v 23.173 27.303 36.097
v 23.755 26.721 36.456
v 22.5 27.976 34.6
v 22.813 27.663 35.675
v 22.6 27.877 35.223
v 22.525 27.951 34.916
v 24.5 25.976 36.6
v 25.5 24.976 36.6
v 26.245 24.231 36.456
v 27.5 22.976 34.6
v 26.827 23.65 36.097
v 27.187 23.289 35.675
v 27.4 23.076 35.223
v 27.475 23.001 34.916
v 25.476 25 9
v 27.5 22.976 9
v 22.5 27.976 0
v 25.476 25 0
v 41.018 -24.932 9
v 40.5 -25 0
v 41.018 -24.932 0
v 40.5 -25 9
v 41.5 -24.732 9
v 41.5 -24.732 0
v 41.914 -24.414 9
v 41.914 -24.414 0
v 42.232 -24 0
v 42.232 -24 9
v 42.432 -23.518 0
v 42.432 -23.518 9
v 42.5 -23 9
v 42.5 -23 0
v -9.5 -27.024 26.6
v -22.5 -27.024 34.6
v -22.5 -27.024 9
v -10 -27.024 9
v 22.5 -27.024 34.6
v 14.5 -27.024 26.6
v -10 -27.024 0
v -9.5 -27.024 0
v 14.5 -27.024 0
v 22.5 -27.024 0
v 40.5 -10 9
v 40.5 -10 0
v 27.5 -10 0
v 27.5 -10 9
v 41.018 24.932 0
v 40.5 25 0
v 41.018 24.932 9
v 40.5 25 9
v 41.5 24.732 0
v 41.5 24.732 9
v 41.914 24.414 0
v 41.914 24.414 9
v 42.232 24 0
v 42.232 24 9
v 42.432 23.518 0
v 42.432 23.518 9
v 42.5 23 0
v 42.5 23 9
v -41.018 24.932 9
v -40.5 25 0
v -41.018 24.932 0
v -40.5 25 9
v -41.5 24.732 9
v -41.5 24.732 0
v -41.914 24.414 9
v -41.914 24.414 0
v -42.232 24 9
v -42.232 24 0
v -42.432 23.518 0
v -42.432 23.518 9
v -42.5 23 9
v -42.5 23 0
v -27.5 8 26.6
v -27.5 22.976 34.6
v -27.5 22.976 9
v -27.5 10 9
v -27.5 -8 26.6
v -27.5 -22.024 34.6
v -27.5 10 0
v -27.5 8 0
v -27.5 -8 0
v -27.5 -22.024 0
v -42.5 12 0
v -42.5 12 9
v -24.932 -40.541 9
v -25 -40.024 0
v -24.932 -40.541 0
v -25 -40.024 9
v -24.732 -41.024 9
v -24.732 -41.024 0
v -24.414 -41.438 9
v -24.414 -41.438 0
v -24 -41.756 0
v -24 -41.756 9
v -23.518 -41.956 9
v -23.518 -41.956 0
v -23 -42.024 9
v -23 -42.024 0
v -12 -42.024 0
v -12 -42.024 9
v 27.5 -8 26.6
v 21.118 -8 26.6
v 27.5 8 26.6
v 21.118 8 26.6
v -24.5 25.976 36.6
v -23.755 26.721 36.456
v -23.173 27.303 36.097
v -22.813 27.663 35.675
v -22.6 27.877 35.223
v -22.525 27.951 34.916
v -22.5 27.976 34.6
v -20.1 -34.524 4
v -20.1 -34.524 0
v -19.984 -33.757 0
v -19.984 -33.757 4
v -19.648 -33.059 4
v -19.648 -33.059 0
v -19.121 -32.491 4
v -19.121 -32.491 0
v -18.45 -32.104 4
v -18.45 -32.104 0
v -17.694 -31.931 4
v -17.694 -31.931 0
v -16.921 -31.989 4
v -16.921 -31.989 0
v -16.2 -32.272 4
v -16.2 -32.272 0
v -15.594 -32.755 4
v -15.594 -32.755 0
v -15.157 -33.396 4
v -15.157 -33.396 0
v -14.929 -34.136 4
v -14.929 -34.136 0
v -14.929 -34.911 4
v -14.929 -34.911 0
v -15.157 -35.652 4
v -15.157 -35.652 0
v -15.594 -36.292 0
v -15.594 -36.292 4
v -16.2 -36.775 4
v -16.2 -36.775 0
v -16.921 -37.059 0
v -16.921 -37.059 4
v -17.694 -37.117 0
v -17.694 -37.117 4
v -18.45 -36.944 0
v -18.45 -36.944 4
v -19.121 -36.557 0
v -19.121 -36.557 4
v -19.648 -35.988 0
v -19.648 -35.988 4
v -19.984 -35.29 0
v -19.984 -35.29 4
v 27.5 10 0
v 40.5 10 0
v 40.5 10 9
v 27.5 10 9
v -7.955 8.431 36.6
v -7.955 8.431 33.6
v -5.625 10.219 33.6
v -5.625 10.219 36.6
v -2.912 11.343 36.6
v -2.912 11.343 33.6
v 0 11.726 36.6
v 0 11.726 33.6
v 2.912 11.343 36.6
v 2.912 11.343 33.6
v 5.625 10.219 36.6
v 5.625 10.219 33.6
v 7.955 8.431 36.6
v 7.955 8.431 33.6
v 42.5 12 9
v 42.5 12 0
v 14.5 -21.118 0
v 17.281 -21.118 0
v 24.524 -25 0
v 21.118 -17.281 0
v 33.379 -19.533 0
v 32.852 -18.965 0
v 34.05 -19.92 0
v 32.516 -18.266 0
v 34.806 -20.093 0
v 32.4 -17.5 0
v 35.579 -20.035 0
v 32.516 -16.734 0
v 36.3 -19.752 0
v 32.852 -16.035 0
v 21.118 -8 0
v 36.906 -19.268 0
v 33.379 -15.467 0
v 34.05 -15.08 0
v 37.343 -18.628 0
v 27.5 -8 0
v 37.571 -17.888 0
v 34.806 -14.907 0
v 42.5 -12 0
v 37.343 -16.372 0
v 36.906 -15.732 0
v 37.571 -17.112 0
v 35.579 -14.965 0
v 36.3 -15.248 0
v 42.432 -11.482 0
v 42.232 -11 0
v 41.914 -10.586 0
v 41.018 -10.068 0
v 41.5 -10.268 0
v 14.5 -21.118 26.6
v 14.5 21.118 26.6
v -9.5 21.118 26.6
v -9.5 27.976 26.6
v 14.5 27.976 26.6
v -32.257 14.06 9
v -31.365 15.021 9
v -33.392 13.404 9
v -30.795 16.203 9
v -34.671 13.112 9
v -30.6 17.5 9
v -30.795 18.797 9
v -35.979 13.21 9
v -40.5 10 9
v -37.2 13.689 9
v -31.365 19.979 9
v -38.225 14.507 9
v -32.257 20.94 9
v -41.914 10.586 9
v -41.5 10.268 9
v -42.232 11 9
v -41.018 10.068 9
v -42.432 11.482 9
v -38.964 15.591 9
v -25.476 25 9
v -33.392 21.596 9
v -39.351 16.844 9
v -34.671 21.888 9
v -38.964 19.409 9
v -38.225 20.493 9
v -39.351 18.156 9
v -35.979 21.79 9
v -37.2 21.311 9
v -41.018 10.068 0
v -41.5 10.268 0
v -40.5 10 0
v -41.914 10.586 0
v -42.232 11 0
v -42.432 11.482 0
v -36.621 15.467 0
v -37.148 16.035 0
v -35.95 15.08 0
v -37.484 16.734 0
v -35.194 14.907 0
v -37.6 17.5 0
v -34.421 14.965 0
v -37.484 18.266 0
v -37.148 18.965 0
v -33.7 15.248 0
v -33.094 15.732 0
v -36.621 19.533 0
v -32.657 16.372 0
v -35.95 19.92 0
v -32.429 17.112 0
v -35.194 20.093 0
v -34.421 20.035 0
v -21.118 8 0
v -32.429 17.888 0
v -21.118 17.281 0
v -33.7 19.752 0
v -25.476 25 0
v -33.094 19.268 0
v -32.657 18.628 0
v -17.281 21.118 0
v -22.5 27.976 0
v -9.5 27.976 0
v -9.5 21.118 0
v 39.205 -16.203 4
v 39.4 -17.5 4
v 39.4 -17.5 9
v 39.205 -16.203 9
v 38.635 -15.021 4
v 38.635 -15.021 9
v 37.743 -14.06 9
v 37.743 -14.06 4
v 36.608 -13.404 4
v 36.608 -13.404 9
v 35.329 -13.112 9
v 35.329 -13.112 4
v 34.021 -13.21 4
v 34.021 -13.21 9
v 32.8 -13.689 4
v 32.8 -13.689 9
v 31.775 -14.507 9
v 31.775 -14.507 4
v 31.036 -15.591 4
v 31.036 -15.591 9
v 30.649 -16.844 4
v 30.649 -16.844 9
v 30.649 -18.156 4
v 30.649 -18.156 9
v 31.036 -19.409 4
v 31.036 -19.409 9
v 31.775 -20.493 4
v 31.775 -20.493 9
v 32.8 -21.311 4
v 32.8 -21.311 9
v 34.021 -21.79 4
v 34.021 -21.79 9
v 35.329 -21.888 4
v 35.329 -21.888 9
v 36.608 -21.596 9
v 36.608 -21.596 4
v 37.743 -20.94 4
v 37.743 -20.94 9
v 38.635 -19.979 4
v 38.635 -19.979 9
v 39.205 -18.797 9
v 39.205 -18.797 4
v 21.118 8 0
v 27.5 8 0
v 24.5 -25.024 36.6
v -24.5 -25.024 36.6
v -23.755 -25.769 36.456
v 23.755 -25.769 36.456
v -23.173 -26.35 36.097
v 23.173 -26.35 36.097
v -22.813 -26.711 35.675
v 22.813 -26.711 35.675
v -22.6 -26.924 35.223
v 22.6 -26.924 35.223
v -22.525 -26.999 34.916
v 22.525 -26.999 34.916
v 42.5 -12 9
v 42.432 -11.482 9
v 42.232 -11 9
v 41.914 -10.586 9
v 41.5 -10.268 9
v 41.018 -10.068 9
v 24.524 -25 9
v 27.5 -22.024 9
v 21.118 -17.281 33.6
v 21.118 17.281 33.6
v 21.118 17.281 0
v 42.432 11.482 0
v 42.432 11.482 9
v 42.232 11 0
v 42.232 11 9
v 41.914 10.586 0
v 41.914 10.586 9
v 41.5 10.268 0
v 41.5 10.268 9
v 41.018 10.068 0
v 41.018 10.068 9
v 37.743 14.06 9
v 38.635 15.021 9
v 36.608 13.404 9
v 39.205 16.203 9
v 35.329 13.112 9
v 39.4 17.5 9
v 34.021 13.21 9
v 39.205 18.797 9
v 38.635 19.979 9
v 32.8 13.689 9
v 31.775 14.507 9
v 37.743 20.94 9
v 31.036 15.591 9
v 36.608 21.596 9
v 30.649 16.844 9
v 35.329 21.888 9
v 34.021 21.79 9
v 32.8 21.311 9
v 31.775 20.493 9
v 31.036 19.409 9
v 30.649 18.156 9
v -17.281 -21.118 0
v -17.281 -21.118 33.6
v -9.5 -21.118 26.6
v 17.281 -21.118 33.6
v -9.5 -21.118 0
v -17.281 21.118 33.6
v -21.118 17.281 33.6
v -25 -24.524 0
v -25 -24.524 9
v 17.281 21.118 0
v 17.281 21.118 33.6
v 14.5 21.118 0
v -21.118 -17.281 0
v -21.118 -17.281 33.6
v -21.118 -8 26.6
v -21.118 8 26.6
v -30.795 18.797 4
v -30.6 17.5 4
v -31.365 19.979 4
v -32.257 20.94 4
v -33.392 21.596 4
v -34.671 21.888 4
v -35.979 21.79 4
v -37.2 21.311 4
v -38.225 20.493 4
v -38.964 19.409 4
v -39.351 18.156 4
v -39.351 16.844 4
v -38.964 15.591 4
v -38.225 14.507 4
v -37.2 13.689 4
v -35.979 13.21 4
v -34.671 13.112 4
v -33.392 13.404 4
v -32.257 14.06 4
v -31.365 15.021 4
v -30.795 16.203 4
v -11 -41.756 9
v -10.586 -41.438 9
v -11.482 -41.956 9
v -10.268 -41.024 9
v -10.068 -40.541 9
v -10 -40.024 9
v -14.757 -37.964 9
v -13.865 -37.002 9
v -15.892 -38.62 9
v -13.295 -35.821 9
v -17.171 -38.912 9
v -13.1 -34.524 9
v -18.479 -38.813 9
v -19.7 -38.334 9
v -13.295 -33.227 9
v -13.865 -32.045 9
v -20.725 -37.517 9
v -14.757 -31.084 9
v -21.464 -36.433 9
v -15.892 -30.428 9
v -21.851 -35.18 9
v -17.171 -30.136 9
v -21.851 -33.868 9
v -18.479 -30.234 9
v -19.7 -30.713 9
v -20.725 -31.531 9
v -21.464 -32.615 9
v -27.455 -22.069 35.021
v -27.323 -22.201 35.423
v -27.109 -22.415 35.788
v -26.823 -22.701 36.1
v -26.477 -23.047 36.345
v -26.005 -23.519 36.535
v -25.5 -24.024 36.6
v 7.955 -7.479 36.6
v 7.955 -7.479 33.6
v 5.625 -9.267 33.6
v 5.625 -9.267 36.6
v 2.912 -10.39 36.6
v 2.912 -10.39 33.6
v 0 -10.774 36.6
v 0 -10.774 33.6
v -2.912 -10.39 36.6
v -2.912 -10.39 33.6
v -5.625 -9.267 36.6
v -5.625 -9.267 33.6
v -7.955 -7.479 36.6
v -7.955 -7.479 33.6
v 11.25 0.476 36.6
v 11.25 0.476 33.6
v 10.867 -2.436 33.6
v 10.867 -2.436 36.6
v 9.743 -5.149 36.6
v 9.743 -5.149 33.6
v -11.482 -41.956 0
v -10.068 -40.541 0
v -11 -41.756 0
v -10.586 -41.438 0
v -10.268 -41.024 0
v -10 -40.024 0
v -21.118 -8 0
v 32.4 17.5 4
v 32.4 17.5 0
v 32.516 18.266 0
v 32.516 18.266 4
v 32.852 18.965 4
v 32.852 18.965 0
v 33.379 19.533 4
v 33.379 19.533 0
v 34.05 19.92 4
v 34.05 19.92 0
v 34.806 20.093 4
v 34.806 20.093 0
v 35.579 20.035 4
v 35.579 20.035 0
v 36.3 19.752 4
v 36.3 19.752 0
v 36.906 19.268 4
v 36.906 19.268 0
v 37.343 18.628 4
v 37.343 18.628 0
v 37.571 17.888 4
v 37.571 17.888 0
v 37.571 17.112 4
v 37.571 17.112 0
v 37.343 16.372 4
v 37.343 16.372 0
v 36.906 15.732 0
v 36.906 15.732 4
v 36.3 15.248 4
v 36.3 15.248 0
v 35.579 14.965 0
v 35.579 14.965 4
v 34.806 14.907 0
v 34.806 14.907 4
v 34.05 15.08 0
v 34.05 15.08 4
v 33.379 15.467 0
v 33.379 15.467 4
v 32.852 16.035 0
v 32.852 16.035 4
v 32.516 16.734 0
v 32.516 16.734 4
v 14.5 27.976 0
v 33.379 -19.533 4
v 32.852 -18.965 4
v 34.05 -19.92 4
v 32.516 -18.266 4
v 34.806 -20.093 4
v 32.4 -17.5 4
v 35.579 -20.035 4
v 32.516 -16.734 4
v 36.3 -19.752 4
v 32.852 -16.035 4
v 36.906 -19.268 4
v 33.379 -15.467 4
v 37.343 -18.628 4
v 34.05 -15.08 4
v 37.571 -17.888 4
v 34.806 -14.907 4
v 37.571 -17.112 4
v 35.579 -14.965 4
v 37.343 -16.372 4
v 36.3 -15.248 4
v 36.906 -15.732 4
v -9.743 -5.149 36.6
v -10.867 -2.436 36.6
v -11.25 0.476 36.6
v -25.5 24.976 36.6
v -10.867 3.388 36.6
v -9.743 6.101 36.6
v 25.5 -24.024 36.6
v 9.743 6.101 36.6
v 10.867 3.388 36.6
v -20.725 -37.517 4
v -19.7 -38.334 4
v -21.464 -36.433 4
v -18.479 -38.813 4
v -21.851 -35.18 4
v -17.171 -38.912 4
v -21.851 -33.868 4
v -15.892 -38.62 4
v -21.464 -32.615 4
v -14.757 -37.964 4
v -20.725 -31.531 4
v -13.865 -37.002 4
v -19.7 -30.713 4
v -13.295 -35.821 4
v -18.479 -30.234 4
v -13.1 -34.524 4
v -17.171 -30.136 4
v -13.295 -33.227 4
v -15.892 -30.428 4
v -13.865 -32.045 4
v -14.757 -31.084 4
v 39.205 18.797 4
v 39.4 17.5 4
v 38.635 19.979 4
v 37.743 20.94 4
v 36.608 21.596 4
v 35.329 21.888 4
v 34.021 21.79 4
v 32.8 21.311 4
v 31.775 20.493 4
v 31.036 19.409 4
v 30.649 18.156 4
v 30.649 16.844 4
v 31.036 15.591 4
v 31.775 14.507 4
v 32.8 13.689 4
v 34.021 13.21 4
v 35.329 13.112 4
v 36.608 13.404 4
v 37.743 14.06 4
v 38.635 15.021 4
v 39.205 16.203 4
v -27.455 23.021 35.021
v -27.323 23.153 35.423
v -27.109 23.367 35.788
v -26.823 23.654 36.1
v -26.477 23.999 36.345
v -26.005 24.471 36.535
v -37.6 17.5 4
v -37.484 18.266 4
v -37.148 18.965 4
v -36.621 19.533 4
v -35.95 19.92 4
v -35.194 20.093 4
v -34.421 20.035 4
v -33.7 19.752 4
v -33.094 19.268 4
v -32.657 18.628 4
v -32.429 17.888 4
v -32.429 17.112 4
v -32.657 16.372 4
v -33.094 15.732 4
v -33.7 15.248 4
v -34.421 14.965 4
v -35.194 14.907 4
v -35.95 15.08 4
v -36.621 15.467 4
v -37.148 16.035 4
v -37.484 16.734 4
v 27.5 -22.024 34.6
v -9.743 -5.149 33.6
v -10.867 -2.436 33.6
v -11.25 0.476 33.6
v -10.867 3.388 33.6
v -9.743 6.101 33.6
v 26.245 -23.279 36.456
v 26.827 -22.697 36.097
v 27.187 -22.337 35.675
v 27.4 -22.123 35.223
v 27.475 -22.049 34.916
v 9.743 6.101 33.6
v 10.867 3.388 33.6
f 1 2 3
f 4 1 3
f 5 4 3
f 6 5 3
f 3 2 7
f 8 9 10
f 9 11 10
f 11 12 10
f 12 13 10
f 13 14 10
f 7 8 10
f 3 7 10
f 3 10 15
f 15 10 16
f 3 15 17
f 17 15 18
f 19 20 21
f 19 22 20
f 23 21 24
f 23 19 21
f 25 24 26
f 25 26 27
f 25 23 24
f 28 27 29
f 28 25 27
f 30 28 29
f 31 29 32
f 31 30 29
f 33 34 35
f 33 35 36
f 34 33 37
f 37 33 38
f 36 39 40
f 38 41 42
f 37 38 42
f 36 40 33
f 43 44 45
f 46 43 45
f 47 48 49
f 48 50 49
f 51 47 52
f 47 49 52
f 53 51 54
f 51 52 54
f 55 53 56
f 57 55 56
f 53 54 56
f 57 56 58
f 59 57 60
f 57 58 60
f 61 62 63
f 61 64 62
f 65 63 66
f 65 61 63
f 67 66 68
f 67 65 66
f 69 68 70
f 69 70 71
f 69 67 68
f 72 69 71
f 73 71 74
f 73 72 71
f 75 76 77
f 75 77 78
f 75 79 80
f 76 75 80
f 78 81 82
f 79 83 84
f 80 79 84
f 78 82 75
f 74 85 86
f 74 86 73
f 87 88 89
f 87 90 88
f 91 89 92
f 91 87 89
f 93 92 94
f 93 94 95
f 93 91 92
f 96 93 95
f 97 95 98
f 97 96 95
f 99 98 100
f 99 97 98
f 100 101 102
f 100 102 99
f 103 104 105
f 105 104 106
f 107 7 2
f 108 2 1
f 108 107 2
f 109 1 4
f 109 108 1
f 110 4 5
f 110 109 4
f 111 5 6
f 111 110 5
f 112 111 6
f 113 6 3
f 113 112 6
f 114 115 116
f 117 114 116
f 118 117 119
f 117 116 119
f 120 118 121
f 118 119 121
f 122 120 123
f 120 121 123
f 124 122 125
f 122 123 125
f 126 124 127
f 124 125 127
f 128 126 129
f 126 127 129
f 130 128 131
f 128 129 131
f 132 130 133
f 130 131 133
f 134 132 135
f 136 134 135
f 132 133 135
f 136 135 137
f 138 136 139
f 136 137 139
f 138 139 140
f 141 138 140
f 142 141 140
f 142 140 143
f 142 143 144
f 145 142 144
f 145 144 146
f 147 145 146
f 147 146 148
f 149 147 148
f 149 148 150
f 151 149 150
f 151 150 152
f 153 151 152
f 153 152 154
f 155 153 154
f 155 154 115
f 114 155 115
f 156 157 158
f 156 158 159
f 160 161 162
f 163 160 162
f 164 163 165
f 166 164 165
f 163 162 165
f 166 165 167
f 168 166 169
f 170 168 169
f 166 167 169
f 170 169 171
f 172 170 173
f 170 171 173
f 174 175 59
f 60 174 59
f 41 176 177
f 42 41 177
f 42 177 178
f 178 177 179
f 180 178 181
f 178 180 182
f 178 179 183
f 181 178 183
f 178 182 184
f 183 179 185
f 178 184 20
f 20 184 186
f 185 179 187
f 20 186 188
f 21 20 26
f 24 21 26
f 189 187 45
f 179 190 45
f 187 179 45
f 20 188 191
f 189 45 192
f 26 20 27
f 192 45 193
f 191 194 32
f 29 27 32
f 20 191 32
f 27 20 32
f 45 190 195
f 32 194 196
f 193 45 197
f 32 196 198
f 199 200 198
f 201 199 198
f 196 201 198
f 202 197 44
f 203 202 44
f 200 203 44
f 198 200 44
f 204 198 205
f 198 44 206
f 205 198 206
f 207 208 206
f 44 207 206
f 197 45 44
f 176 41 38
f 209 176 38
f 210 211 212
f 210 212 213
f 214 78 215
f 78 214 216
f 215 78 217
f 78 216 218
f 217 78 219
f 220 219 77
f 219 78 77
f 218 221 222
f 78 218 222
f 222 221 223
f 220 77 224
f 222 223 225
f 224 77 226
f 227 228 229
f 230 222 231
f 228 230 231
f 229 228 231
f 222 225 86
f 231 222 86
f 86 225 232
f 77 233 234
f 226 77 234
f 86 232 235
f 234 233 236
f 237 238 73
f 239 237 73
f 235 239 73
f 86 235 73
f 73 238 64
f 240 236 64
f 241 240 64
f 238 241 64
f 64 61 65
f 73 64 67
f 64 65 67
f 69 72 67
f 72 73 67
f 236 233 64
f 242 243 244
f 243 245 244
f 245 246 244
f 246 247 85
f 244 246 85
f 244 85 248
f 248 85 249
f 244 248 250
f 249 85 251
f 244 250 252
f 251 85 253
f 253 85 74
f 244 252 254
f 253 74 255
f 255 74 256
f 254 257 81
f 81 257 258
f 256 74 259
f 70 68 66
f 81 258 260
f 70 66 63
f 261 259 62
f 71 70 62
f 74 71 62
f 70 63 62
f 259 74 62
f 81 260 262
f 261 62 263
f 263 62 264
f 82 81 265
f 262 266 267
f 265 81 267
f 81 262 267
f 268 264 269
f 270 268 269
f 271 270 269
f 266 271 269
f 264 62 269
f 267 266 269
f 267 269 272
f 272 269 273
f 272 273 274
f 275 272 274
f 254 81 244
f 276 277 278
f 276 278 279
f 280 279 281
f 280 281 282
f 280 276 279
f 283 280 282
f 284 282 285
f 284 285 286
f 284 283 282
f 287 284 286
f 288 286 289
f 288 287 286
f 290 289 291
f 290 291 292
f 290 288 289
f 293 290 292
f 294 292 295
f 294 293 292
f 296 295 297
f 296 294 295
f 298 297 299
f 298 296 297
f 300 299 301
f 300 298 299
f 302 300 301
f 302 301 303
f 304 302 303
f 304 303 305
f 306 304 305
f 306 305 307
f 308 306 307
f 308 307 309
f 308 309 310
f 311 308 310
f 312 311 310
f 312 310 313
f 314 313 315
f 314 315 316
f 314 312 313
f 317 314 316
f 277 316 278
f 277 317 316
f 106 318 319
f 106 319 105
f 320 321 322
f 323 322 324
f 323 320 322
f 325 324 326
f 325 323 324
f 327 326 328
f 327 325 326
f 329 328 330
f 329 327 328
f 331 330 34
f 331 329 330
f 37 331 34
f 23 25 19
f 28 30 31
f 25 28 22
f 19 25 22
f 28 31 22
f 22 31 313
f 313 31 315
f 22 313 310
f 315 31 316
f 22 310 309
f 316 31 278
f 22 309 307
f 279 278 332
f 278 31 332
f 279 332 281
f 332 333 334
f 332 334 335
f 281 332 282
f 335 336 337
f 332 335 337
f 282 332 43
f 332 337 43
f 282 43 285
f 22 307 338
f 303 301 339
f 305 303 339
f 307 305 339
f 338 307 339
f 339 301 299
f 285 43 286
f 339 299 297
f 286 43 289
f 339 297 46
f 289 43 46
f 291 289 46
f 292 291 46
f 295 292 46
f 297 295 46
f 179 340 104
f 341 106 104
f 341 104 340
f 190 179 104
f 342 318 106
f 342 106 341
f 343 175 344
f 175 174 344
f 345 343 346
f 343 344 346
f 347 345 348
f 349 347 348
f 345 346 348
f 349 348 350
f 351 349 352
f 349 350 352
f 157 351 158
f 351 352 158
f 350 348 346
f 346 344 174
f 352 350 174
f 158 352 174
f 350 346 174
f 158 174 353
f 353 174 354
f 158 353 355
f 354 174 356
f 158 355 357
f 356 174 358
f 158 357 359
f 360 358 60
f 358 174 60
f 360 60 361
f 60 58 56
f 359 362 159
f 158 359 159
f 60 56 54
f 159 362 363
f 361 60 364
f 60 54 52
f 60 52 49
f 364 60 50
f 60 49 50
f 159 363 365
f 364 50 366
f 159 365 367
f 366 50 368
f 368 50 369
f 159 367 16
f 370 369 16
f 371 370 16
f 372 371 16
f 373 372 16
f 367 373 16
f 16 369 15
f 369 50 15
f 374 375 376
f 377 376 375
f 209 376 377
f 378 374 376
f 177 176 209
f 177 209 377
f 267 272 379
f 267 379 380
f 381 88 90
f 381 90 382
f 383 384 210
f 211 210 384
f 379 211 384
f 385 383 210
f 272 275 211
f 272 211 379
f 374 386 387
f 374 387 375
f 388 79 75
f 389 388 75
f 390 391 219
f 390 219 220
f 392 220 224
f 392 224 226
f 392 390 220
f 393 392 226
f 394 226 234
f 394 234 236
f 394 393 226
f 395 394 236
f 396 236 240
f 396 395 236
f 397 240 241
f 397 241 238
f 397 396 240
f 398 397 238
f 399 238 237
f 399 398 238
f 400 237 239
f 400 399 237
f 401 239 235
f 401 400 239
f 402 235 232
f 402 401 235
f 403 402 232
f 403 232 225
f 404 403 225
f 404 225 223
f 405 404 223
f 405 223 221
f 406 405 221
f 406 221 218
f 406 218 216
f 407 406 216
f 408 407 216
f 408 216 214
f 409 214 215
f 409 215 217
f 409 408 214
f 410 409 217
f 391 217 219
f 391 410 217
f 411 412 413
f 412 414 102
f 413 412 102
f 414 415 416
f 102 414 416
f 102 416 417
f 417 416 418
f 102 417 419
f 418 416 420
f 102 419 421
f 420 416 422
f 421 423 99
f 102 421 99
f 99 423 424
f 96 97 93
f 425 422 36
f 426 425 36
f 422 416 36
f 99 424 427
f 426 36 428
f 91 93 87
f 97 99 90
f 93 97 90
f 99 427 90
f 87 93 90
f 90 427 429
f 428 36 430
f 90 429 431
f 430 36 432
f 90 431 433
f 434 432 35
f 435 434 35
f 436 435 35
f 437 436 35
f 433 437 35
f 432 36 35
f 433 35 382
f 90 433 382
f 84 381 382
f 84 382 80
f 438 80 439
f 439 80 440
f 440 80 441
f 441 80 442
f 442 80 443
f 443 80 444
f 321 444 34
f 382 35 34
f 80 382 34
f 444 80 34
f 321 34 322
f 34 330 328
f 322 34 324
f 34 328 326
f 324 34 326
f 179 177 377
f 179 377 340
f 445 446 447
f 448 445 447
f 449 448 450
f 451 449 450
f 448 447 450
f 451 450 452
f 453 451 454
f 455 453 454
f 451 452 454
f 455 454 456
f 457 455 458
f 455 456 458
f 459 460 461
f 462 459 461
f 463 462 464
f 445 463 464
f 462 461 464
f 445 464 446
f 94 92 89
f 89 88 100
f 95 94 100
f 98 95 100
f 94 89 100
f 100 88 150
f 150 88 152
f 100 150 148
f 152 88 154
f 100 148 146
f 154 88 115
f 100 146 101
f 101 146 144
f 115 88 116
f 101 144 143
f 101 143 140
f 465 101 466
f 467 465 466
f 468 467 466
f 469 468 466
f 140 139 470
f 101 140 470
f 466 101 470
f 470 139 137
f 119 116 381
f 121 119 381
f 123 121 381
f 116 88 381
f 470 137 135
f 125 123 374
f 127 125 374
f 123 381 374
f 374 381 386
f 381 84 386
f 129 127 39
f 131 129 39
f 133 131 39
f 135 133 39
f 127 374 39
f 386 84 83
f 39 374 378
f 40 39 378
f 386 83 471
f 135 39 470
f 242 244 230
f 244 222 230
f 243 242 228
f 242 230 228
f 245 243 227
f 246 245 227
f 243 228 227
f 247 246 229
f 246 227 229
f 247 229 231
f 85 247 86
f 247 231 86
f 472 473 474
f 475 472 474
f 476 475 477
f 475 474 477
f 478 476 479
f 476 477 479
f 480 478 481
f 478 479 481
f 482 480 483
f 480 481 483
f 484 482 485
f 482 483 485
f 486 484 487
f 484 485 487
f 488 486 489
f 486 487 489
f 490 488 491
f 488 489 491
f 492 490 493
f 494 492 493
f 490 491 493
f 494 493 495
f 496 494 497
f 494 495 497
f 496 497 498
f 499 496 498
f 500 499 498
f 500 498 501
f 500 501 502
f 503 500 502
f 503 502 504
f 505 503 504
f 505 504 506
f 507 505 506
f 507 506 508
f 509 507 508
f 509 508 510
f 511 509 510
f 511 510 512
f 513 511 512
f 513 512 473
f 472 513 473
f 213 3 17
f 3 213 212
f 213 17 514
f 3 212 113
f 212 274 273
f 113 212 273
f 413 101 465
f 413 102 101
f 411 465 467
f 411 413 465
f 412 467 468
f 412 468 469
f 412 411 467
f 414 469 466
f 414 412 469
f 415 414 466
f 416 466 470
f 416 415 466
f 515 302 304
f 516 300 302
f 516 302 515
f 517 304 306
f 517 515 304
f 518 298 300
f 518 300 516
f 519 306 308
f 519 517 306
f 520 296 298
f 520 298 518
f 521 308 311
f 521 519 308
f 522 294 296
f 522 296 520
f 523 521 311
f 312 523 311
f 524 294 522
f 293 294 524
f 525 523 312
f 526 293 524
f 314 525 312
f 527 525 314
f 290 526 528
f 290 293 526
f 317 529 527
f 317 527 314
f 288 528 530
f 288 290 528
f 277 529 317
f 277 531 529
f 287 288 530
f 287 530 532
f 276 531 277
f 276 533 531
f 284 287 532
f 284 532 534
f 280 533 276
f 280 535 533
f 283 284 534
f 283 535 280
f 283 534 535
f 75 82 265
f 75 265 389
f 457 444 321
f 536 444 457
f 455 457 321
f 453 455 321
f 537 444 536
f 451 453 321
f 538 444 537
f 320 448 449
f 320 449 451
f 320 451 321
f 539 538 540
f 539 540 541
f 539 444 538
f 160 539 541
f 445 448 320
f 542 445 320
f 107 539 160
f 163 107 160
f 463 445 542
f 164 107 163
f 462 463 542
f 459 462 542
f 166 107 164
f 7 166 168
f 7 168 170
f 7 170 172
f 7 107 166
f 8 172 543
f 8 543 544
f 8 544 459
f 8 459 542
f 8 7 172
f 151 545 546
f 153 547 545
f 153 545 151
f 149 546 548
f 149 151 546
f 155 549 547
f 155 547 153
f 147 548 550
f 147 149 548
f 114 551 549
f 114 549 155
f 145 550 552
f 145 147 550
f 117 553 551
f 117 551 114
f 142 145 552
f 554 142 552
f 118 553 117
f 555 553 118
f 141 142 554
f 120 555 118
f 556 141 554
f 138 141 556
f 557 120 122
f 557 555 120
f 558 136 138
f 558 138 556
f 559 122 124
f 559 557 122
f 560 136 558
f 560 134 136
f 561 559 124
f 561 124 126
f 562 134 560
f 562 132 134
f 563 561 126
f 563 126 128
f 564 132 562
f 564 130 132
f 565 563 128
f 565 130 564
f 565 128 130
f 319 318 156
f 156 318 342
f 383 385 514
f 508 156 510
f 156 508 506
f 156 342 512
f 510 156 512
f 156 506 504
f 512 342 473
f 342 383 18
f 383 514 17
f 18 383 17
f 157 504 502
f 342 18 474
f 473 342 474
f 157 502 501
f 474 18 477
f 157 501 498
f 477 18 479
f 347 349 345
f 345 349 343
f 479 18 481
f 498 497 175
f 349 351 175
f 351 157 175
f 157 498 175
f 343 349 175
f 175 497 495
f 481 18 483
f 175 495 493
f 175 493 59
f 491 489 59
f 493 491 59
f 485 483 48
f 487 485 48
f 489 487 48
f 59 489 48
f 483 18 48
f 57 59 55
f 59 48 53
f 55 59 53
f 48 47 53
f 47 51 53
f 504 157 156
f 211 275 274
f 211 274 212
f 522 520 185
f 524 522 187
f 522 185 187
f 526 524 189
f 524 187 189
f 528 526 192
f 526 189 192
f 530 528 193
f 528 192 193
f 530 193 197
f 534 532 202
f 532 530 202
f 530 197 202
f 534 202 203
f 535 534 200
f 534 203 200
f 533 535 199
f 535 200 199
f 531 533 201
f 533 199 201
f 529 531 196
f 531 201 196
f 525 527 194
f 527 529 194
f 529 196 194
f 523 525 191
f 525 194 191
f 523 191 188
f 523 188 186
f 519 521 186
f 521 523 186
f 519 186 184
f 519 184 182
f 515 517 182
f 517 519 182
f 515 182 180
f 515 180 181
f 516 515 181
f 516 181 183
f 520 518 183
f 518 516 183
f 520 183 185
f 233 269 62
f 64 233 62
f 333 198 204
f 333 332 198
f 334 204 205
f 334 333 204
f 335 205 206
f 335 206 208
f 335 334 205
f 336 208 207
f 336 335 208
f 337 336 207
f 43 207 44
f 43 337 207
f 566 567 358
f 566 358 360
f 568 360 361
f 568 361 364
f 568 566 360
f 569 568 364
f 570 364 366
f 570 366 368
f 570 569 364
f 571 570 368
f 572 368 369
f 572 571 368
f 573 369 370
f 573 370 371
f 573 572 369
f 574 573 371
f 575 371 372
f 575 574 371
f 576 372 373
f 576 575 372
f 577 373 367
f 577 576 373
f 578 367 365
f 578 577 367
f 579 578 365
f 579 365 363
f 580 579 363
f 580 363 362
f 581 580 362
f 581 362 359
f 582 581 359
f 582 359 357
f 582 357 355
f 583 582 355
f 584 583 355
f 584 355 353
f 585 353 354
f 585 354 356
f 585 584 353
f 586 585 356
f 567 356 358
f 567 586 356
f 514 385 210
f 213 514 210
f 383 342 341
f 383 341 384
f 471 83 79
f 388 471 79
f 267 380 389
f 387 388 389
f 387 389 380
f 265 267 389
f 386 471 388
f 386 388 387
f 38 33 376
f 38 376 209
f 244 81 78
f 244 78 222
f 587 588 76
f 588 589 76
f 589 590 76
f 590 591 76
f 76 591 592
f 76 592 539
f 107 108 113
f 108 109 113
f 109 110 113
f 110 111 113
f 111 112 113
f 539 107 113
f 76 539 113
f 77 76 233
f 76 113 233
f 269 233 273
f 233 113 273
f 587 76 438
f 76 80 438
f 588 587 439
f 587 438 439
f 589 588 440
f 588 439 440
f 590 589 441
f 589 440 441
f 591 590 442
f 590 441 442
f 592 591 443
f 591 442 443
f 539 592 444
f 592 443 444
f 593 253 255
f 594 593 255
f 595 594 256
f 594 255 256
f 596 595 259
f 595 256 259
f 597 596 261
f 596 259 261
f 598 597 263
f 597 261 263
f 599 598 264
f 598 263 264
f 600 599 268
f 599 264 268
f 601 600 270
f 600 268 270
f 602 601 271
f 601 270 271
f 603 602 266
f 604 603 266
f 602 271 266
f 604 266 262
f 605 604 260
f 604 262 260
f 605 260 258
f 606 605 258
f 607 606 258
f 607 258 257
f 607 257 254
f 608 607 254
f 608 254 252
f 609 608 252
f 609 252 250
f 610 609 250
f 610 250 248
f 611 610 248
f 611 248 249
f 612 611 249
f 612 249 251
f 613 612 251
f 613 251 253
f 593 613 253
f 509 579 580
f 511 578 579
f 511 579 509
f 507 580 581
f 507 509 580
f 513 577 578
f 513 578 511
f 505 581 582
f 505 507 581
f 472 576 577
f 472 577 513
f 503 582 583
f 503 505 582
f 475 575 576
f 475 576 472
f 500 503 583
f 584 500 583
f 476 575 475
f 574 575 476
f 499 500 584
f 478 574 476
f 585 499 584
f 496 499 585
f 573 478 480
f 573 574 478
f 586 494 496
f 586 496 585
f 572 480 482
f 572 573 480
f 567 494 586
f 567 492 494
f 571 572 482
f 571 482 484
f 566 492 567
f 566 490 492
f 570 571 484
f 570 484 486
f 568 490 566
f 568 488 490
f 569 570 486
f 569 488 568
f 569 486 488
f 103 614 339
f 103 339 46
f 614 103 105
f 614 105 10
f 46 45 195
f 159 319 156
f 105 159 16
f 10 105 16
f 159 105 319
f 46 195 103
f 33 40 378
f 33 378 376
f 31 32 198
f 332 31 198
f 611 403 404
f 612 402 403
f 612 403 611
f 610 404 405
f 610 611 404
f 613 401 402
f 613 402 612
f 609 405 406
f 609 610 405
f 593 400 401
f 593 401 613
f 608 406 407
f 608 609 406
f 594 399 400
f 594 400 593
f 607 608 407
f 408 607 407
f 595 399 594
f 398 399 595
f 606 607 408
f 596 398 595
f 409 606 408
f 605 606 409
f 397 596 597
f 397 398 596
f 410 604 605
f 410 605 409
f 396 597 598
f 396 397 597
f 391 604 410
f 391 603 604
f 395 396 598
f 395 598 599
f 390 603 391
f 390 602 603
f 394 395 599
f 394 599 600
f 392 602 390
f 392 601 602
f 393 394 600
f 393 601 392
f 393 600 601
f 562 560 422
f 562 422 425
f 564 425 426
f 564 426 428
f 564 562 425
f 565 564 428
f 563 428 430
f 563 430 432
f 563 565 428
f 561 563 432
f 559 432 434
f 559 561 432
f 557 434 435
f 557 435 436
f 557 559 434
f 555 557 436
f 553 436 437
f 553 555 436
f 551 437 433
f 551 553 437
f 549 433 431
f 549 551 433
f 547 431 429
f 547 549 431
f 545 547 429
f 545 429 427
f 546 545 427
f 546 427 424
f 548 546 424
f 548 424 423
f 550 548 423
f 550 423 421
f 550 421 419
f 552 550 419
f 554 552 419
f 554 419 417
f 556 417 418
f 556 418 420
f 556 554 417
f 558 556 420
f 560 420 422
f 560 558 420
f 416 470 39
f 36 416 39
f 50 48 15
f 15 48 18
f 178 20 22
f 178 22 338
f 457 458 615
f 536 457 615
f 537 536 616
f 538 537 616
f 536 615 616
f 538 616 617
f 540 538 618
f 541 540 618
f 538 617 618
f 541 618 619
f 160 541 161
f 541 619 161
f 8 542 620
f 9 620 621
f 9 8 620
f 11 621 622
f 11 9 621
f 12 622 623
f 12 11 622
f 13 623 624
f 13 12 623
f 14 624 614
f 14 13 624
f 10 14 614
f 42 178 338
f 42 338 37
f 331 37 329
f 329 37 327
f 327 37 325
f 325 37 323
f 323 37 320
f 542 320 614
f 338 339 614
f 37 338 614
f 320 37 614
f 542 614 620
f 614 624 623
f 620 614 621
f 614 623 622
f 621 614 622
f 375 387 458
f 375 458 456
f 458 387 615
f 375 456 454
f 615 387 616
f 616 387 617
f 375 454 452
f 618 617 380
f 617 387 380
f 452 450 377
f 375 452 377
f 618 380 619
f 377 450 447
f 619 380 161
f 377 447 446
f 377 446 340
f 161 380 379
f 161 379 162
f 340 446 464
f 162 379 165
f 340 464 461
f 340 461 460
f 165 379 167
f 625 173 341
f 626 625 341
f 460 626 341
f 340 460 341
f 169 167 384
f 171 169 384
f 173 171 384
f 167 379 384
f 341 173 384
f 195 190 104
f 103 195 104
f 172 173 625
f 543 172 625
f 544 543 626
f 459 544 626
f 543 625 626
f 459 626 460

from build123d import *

# Parameters (mm, degrees)
SKETCH2_W           = 55
SKETCH2_H           = 55
BOSS_EXTRUDE1_DEPTH = 33.6
BOSS_EXTRUDE2_DEPTH = 3
SKETCH4_W           = 15
SKETCH4_H           = 15
SKETCH4_R           = 2.6
BOSS_EXTRUDE3_DEPTH = 9
CUT_EXTRUDE1_START  = -5
SKETCH6_R           = 4.4
SKETCH6_R_2         = 2.6
CUT_EXTRUDE1_DEPTH  = 5
CHAMFER1_SIZE       = 5
FILLET4_R           = 2
SKETCH7_W           = 24
SKETCH7_H           = 26.6
CUT_EXTRUDE2_DEPTH  = 67
SKETCH8_W           = 26.6
SKETCH8_H           = 16
CUT_EXTRUDE3_DEPTH  = 67


with BuildPart() as part:
    # Sketch2 → Boss-Extrude1 (new body)
    with BuildSketch(Plane.XY):
        with Locations((0, 0.476186899)):
            Rectangle(SKETCH2_W, SKETCH2_H)
        Polygon((21.118377871, -17.280631787), (21.118377871, 17.280631787), (17.280631787, 21.118377871), (-17.280631787, 21.118377871), (-21.118377871, 17.280631787), (-21.118377871, -17.280631787), (-17.280631787, -21.118377871), (17.280631787, -21.118377871), align=None, mode=Mode.SUBTRACT)
    extrude(amount=BOSS_EXTRUDE1_DEPTH)

    # Sketch3 → Boss-Extrude2 (add)
    with BuildSketch(Plane.XY.offset(33.6)):
        with BuildLine():
            Line((-7.954951288, 8.431138187), (-18.961411379, 19.437598278))
            Line((-18.961411379, 19.437598278), (-21.118377871, 17.280631787))
            Line((-21.118377871, 17.280631787), (-21.118377871, -17.280631787))
            Line((-21.118377871, -17.280631787), (-19.437598278, -18.961411379))
            Line((-19.437598278, -18.961411379), (-7.954951288, -7.478764389))
            ThreePointArc((-7.954951288, -7.478764389), (-11.25, 0.476186899), (-7.954951288, 8.431138187))
        make_face()
        with BuildLine():
            Line((-7.954951288, -7.478764389), (-19.437598278, -18.961411379))
            Line((-19.437598278, -18.961411379), (-17.280631787, -21.118377871))
            Line((-17.280631787, -21.118377871), (17.280631787, -21.118377871))
            Line((17.280631787, -21.118377871), (19.437598278, -18.961411379))
            Line((19.437598278, -18.961411379), (7.954951288, -7.478764389))
            ThreePointArc((7.954951288, -7.478764389), (0, -10.773813101), (-7.954951288, -7.478764389))
        make_face()
        with BuildLine():
            Line((21.118377871, 17.280631787), (18.961411379, 19.437598278))
            Line((18.961411379, 19.437598278), (7.954951288, 8.431138187))
            ThreePointArc((7.954951288, 8.431138187), (10.393644741, 4.781375513), (11.25, 0.476186899))
            ThreePointArc((11.25, 0.476186899), (10.393644741, -3.829001715), (7.954951288, -7.478764389))
            Line((7.954951288, -7.478764389), (19.437598278, -18.961411379))
            Line((19.437598278, -18.961411379), (21.118377871, -17.280631787))
            Line((21.118377871, -17.280631787), (21.118377871, 17.280631787))
        make_face()
        with BuildLine():
            Line((-17.280631787, 21.118377871), (-18.961411379, 19.437598278))
            Line((-18.961411379, 19.437598278), (-7.954951288, 8.431138187))
            ThreePointArc((-7.954951288, 8.431138187), (0, 11.726186899), (7.954951288, 8.431138187))
            Line((7.954951288, 8.431138187), (18.961411379, 19.437598278))
            Line((18.961411379, 19.437598278), (17.280631787, 21.118377871))
            Line((17.280631787, 21.118377871), (-17.280631787, 21.118377871))
        make_face()
        Polygon((-18.961411379, 19.437598278), (-27.5, 27.976186899), (-27.5, -27.023813101), (-19.437598278, -18.961411379), (-21.118377871, -17.280631787), (-21.118377871, 17.280631787), align=None)
        Polygon((-19.437598278, -18.961411379), (-27.5, -27.023813101), (27.5, -27.023813101), (19.437598278, -18.961411379), (17.280631787, -21.118377871), (-17.280631787, -21.118377871), align=None)
        Polygon((27.5, -27.023813101), (27.5, 27.976186899), (18.961411379, 19.437598278), (21.118377871, 17.280631787), (21.118377871, -17.280631787), (19.437598278, -18.961411379), align=None)
        Polygon((27.5, 27.976186899), (-27.5, 27.976186899), (-18.961411379, 19.437598278), (-17.280631787, 21.118377871), (17.280631787, 21.118377871), (18.961411379, 19.437598278), align=None)
    extrude(amount=BOSS_EXTRUDE2_DEPTH)

    # Sketch4 → Boss-Extrude3 (add)
    # profile 1 of 4: a face of its own
    with BuildSketch(Plane(origin=(0, 0, 0), x_dir=(-1, 0, 0), z_dir=(0, 0, -1))):
        with Locations((-35, 17.5)):
            Rectangle(SKETCH4_W, SKETCH4_H)
        with Locations((-35, 17.5)):
            Circle(SKETCH4_R, mode=Mode.SUBTRACT)
    # profile 2 of 4: a face of its own
    with BuildSketch(Plane(origin=(0, 0, 0), x_dir=(-1, 0, 0), z_dir=(0, 0, -1))):
        with Locations((35, 17.5)):
            Rectangle(SKETCH4_W, SKETCH4_H)
        with Locations((35, 17.5)):
            Circle(SKETCH4_R, mode=Mode.SUBTRACT)
    # profile 3 of 4: a face of its own
    with BuildSketch(Plane(origin=(0, 0, 0), x_dir=(-1, 0, 0), z_dir=(0, 0, -1))):
        with Locations((-35, -17.5)):
            Rectangle(SKETCH4_W, SKETCH4_H)
        with Locations((-35, -17.5)):
            Circle(SKETCH4_R, mode=Mode.SUBTRACT)
    # profile 4 of 4: a face of its own
    with BuildSketch(Plane(origin=(0, 0, 0), x_dir=(-1, 0, 0), z_dir=(0, 0, -1))):
        with Locations((17.5, -34.523813101)):
            Rectangle(SKETCH4_W, SKETCH4_H)
        with Locations((17.5, -34.523813101)):
            Circle(SKETCH4_R, mode=Mode.SUBTRACT)
    extrude(amount=-BOSS_EXTRUDE3_DEPTH)

    # Sketch6 → Cut-Extrude1 (cut)
    # profile 1 of 4: a face of its own
    with BuildSketch(Plane.XY.offset(9).offset(CUT_EXTRUDE1_START)):
        with Locations((-17.5, -34.523813101)):
            Circle(SKETCH6_R)
    # profile 2 of 4: a face of its own
    with BuildSketch(Plane.XY.offset(9).offset(CUT_EXTRUDE1_START)):
        with Locations((-35, 17.5)):
            Circle(SKETCH6_R)
    # profile 3 of 4: a face of its own
    with BuildSketch(Plane.XY.offset(9).offset(CUT_EXTRUDE1_START)):
        with Locations((35, -17.5)):
            Circle(SKETCH6_R)
        with Locations(Location((35, -17.5, 0), (0, 0, 180))):
            Circle(SKETCH6_R_2, mode=Mode.SUBTRACT)
    # profile 4 of 4: a face of its own
    with BuildSketch(Plane.XY.offset(9).offset(CUT_EXTRUDE1_START)):
        with Locations((35, 17.5)):
            Circle(SKETCH6_R)
    extrude(amount=CUT_EXTRUDE1_DEPTH, mode=Mode.SUBTRACT)

    # Chamfer1
    chamfer1_edges = [part.edges().sort_by_distance(p)[0] for p in [
        (27.5, -27.023813101, 18.3),
        (-27.5, -27.023813101, 18.3),
        (27.5, 27.976186899, 18.3),
        (-27.5, 27.976186899, 18.3),
    ]]
    chamfer(chamfer1_edges, length=CHAMFER1_SIZE)

    # Fillet4
    fillet4_edges = [part.edges().sort_by_distance(p)[0] for p in [
        (0, 27.976186899, 36.6),
        (27.5, 0.476186899, 36.6),
        (0, -27.023813101, 36.6),
        (-27.5, 0.476186899, 36.6),
        (-25, -42.023813101, 4.5),
        (-10, -42.023813101, 4.5),
        (-42.5, 10, 4.5),
        (-42.5, 25, 4.5),
        (42.5, -25, 4.5),
        (42.5, -10, 4.5),
        (42.5, 10, 4.5),
        (42.5, 25, 4.5),
    ]]
    fillet(fillet4_edges, radius=FILLET4_R)

    # Sketch7 → Cut-Extrude2 (cut)
    with BuildSketch(Plane.XZ.offset(27.023813101)):
        with Locations((2.5, 13.3)):
            Rectangle(SKETCH7_W, SKETCH7_H)
    extrude(amount=-CUT_EXTRUDE2_DEPTH, mode=Mode.SUBTRACT)

    # Sketch8 → Cut-Extrude3 (cut)
    with BuildSketch(Plane.ZY.offset(27.5)):
        with Locations((13.3, 0)):
            Rectangle(SKETCH8_W, SKETCH8_H)
    extrude(amount=-CUT_EXTRUDE3_DEPTH, mode=Mode.SUBTRACT)


solid = part.part
